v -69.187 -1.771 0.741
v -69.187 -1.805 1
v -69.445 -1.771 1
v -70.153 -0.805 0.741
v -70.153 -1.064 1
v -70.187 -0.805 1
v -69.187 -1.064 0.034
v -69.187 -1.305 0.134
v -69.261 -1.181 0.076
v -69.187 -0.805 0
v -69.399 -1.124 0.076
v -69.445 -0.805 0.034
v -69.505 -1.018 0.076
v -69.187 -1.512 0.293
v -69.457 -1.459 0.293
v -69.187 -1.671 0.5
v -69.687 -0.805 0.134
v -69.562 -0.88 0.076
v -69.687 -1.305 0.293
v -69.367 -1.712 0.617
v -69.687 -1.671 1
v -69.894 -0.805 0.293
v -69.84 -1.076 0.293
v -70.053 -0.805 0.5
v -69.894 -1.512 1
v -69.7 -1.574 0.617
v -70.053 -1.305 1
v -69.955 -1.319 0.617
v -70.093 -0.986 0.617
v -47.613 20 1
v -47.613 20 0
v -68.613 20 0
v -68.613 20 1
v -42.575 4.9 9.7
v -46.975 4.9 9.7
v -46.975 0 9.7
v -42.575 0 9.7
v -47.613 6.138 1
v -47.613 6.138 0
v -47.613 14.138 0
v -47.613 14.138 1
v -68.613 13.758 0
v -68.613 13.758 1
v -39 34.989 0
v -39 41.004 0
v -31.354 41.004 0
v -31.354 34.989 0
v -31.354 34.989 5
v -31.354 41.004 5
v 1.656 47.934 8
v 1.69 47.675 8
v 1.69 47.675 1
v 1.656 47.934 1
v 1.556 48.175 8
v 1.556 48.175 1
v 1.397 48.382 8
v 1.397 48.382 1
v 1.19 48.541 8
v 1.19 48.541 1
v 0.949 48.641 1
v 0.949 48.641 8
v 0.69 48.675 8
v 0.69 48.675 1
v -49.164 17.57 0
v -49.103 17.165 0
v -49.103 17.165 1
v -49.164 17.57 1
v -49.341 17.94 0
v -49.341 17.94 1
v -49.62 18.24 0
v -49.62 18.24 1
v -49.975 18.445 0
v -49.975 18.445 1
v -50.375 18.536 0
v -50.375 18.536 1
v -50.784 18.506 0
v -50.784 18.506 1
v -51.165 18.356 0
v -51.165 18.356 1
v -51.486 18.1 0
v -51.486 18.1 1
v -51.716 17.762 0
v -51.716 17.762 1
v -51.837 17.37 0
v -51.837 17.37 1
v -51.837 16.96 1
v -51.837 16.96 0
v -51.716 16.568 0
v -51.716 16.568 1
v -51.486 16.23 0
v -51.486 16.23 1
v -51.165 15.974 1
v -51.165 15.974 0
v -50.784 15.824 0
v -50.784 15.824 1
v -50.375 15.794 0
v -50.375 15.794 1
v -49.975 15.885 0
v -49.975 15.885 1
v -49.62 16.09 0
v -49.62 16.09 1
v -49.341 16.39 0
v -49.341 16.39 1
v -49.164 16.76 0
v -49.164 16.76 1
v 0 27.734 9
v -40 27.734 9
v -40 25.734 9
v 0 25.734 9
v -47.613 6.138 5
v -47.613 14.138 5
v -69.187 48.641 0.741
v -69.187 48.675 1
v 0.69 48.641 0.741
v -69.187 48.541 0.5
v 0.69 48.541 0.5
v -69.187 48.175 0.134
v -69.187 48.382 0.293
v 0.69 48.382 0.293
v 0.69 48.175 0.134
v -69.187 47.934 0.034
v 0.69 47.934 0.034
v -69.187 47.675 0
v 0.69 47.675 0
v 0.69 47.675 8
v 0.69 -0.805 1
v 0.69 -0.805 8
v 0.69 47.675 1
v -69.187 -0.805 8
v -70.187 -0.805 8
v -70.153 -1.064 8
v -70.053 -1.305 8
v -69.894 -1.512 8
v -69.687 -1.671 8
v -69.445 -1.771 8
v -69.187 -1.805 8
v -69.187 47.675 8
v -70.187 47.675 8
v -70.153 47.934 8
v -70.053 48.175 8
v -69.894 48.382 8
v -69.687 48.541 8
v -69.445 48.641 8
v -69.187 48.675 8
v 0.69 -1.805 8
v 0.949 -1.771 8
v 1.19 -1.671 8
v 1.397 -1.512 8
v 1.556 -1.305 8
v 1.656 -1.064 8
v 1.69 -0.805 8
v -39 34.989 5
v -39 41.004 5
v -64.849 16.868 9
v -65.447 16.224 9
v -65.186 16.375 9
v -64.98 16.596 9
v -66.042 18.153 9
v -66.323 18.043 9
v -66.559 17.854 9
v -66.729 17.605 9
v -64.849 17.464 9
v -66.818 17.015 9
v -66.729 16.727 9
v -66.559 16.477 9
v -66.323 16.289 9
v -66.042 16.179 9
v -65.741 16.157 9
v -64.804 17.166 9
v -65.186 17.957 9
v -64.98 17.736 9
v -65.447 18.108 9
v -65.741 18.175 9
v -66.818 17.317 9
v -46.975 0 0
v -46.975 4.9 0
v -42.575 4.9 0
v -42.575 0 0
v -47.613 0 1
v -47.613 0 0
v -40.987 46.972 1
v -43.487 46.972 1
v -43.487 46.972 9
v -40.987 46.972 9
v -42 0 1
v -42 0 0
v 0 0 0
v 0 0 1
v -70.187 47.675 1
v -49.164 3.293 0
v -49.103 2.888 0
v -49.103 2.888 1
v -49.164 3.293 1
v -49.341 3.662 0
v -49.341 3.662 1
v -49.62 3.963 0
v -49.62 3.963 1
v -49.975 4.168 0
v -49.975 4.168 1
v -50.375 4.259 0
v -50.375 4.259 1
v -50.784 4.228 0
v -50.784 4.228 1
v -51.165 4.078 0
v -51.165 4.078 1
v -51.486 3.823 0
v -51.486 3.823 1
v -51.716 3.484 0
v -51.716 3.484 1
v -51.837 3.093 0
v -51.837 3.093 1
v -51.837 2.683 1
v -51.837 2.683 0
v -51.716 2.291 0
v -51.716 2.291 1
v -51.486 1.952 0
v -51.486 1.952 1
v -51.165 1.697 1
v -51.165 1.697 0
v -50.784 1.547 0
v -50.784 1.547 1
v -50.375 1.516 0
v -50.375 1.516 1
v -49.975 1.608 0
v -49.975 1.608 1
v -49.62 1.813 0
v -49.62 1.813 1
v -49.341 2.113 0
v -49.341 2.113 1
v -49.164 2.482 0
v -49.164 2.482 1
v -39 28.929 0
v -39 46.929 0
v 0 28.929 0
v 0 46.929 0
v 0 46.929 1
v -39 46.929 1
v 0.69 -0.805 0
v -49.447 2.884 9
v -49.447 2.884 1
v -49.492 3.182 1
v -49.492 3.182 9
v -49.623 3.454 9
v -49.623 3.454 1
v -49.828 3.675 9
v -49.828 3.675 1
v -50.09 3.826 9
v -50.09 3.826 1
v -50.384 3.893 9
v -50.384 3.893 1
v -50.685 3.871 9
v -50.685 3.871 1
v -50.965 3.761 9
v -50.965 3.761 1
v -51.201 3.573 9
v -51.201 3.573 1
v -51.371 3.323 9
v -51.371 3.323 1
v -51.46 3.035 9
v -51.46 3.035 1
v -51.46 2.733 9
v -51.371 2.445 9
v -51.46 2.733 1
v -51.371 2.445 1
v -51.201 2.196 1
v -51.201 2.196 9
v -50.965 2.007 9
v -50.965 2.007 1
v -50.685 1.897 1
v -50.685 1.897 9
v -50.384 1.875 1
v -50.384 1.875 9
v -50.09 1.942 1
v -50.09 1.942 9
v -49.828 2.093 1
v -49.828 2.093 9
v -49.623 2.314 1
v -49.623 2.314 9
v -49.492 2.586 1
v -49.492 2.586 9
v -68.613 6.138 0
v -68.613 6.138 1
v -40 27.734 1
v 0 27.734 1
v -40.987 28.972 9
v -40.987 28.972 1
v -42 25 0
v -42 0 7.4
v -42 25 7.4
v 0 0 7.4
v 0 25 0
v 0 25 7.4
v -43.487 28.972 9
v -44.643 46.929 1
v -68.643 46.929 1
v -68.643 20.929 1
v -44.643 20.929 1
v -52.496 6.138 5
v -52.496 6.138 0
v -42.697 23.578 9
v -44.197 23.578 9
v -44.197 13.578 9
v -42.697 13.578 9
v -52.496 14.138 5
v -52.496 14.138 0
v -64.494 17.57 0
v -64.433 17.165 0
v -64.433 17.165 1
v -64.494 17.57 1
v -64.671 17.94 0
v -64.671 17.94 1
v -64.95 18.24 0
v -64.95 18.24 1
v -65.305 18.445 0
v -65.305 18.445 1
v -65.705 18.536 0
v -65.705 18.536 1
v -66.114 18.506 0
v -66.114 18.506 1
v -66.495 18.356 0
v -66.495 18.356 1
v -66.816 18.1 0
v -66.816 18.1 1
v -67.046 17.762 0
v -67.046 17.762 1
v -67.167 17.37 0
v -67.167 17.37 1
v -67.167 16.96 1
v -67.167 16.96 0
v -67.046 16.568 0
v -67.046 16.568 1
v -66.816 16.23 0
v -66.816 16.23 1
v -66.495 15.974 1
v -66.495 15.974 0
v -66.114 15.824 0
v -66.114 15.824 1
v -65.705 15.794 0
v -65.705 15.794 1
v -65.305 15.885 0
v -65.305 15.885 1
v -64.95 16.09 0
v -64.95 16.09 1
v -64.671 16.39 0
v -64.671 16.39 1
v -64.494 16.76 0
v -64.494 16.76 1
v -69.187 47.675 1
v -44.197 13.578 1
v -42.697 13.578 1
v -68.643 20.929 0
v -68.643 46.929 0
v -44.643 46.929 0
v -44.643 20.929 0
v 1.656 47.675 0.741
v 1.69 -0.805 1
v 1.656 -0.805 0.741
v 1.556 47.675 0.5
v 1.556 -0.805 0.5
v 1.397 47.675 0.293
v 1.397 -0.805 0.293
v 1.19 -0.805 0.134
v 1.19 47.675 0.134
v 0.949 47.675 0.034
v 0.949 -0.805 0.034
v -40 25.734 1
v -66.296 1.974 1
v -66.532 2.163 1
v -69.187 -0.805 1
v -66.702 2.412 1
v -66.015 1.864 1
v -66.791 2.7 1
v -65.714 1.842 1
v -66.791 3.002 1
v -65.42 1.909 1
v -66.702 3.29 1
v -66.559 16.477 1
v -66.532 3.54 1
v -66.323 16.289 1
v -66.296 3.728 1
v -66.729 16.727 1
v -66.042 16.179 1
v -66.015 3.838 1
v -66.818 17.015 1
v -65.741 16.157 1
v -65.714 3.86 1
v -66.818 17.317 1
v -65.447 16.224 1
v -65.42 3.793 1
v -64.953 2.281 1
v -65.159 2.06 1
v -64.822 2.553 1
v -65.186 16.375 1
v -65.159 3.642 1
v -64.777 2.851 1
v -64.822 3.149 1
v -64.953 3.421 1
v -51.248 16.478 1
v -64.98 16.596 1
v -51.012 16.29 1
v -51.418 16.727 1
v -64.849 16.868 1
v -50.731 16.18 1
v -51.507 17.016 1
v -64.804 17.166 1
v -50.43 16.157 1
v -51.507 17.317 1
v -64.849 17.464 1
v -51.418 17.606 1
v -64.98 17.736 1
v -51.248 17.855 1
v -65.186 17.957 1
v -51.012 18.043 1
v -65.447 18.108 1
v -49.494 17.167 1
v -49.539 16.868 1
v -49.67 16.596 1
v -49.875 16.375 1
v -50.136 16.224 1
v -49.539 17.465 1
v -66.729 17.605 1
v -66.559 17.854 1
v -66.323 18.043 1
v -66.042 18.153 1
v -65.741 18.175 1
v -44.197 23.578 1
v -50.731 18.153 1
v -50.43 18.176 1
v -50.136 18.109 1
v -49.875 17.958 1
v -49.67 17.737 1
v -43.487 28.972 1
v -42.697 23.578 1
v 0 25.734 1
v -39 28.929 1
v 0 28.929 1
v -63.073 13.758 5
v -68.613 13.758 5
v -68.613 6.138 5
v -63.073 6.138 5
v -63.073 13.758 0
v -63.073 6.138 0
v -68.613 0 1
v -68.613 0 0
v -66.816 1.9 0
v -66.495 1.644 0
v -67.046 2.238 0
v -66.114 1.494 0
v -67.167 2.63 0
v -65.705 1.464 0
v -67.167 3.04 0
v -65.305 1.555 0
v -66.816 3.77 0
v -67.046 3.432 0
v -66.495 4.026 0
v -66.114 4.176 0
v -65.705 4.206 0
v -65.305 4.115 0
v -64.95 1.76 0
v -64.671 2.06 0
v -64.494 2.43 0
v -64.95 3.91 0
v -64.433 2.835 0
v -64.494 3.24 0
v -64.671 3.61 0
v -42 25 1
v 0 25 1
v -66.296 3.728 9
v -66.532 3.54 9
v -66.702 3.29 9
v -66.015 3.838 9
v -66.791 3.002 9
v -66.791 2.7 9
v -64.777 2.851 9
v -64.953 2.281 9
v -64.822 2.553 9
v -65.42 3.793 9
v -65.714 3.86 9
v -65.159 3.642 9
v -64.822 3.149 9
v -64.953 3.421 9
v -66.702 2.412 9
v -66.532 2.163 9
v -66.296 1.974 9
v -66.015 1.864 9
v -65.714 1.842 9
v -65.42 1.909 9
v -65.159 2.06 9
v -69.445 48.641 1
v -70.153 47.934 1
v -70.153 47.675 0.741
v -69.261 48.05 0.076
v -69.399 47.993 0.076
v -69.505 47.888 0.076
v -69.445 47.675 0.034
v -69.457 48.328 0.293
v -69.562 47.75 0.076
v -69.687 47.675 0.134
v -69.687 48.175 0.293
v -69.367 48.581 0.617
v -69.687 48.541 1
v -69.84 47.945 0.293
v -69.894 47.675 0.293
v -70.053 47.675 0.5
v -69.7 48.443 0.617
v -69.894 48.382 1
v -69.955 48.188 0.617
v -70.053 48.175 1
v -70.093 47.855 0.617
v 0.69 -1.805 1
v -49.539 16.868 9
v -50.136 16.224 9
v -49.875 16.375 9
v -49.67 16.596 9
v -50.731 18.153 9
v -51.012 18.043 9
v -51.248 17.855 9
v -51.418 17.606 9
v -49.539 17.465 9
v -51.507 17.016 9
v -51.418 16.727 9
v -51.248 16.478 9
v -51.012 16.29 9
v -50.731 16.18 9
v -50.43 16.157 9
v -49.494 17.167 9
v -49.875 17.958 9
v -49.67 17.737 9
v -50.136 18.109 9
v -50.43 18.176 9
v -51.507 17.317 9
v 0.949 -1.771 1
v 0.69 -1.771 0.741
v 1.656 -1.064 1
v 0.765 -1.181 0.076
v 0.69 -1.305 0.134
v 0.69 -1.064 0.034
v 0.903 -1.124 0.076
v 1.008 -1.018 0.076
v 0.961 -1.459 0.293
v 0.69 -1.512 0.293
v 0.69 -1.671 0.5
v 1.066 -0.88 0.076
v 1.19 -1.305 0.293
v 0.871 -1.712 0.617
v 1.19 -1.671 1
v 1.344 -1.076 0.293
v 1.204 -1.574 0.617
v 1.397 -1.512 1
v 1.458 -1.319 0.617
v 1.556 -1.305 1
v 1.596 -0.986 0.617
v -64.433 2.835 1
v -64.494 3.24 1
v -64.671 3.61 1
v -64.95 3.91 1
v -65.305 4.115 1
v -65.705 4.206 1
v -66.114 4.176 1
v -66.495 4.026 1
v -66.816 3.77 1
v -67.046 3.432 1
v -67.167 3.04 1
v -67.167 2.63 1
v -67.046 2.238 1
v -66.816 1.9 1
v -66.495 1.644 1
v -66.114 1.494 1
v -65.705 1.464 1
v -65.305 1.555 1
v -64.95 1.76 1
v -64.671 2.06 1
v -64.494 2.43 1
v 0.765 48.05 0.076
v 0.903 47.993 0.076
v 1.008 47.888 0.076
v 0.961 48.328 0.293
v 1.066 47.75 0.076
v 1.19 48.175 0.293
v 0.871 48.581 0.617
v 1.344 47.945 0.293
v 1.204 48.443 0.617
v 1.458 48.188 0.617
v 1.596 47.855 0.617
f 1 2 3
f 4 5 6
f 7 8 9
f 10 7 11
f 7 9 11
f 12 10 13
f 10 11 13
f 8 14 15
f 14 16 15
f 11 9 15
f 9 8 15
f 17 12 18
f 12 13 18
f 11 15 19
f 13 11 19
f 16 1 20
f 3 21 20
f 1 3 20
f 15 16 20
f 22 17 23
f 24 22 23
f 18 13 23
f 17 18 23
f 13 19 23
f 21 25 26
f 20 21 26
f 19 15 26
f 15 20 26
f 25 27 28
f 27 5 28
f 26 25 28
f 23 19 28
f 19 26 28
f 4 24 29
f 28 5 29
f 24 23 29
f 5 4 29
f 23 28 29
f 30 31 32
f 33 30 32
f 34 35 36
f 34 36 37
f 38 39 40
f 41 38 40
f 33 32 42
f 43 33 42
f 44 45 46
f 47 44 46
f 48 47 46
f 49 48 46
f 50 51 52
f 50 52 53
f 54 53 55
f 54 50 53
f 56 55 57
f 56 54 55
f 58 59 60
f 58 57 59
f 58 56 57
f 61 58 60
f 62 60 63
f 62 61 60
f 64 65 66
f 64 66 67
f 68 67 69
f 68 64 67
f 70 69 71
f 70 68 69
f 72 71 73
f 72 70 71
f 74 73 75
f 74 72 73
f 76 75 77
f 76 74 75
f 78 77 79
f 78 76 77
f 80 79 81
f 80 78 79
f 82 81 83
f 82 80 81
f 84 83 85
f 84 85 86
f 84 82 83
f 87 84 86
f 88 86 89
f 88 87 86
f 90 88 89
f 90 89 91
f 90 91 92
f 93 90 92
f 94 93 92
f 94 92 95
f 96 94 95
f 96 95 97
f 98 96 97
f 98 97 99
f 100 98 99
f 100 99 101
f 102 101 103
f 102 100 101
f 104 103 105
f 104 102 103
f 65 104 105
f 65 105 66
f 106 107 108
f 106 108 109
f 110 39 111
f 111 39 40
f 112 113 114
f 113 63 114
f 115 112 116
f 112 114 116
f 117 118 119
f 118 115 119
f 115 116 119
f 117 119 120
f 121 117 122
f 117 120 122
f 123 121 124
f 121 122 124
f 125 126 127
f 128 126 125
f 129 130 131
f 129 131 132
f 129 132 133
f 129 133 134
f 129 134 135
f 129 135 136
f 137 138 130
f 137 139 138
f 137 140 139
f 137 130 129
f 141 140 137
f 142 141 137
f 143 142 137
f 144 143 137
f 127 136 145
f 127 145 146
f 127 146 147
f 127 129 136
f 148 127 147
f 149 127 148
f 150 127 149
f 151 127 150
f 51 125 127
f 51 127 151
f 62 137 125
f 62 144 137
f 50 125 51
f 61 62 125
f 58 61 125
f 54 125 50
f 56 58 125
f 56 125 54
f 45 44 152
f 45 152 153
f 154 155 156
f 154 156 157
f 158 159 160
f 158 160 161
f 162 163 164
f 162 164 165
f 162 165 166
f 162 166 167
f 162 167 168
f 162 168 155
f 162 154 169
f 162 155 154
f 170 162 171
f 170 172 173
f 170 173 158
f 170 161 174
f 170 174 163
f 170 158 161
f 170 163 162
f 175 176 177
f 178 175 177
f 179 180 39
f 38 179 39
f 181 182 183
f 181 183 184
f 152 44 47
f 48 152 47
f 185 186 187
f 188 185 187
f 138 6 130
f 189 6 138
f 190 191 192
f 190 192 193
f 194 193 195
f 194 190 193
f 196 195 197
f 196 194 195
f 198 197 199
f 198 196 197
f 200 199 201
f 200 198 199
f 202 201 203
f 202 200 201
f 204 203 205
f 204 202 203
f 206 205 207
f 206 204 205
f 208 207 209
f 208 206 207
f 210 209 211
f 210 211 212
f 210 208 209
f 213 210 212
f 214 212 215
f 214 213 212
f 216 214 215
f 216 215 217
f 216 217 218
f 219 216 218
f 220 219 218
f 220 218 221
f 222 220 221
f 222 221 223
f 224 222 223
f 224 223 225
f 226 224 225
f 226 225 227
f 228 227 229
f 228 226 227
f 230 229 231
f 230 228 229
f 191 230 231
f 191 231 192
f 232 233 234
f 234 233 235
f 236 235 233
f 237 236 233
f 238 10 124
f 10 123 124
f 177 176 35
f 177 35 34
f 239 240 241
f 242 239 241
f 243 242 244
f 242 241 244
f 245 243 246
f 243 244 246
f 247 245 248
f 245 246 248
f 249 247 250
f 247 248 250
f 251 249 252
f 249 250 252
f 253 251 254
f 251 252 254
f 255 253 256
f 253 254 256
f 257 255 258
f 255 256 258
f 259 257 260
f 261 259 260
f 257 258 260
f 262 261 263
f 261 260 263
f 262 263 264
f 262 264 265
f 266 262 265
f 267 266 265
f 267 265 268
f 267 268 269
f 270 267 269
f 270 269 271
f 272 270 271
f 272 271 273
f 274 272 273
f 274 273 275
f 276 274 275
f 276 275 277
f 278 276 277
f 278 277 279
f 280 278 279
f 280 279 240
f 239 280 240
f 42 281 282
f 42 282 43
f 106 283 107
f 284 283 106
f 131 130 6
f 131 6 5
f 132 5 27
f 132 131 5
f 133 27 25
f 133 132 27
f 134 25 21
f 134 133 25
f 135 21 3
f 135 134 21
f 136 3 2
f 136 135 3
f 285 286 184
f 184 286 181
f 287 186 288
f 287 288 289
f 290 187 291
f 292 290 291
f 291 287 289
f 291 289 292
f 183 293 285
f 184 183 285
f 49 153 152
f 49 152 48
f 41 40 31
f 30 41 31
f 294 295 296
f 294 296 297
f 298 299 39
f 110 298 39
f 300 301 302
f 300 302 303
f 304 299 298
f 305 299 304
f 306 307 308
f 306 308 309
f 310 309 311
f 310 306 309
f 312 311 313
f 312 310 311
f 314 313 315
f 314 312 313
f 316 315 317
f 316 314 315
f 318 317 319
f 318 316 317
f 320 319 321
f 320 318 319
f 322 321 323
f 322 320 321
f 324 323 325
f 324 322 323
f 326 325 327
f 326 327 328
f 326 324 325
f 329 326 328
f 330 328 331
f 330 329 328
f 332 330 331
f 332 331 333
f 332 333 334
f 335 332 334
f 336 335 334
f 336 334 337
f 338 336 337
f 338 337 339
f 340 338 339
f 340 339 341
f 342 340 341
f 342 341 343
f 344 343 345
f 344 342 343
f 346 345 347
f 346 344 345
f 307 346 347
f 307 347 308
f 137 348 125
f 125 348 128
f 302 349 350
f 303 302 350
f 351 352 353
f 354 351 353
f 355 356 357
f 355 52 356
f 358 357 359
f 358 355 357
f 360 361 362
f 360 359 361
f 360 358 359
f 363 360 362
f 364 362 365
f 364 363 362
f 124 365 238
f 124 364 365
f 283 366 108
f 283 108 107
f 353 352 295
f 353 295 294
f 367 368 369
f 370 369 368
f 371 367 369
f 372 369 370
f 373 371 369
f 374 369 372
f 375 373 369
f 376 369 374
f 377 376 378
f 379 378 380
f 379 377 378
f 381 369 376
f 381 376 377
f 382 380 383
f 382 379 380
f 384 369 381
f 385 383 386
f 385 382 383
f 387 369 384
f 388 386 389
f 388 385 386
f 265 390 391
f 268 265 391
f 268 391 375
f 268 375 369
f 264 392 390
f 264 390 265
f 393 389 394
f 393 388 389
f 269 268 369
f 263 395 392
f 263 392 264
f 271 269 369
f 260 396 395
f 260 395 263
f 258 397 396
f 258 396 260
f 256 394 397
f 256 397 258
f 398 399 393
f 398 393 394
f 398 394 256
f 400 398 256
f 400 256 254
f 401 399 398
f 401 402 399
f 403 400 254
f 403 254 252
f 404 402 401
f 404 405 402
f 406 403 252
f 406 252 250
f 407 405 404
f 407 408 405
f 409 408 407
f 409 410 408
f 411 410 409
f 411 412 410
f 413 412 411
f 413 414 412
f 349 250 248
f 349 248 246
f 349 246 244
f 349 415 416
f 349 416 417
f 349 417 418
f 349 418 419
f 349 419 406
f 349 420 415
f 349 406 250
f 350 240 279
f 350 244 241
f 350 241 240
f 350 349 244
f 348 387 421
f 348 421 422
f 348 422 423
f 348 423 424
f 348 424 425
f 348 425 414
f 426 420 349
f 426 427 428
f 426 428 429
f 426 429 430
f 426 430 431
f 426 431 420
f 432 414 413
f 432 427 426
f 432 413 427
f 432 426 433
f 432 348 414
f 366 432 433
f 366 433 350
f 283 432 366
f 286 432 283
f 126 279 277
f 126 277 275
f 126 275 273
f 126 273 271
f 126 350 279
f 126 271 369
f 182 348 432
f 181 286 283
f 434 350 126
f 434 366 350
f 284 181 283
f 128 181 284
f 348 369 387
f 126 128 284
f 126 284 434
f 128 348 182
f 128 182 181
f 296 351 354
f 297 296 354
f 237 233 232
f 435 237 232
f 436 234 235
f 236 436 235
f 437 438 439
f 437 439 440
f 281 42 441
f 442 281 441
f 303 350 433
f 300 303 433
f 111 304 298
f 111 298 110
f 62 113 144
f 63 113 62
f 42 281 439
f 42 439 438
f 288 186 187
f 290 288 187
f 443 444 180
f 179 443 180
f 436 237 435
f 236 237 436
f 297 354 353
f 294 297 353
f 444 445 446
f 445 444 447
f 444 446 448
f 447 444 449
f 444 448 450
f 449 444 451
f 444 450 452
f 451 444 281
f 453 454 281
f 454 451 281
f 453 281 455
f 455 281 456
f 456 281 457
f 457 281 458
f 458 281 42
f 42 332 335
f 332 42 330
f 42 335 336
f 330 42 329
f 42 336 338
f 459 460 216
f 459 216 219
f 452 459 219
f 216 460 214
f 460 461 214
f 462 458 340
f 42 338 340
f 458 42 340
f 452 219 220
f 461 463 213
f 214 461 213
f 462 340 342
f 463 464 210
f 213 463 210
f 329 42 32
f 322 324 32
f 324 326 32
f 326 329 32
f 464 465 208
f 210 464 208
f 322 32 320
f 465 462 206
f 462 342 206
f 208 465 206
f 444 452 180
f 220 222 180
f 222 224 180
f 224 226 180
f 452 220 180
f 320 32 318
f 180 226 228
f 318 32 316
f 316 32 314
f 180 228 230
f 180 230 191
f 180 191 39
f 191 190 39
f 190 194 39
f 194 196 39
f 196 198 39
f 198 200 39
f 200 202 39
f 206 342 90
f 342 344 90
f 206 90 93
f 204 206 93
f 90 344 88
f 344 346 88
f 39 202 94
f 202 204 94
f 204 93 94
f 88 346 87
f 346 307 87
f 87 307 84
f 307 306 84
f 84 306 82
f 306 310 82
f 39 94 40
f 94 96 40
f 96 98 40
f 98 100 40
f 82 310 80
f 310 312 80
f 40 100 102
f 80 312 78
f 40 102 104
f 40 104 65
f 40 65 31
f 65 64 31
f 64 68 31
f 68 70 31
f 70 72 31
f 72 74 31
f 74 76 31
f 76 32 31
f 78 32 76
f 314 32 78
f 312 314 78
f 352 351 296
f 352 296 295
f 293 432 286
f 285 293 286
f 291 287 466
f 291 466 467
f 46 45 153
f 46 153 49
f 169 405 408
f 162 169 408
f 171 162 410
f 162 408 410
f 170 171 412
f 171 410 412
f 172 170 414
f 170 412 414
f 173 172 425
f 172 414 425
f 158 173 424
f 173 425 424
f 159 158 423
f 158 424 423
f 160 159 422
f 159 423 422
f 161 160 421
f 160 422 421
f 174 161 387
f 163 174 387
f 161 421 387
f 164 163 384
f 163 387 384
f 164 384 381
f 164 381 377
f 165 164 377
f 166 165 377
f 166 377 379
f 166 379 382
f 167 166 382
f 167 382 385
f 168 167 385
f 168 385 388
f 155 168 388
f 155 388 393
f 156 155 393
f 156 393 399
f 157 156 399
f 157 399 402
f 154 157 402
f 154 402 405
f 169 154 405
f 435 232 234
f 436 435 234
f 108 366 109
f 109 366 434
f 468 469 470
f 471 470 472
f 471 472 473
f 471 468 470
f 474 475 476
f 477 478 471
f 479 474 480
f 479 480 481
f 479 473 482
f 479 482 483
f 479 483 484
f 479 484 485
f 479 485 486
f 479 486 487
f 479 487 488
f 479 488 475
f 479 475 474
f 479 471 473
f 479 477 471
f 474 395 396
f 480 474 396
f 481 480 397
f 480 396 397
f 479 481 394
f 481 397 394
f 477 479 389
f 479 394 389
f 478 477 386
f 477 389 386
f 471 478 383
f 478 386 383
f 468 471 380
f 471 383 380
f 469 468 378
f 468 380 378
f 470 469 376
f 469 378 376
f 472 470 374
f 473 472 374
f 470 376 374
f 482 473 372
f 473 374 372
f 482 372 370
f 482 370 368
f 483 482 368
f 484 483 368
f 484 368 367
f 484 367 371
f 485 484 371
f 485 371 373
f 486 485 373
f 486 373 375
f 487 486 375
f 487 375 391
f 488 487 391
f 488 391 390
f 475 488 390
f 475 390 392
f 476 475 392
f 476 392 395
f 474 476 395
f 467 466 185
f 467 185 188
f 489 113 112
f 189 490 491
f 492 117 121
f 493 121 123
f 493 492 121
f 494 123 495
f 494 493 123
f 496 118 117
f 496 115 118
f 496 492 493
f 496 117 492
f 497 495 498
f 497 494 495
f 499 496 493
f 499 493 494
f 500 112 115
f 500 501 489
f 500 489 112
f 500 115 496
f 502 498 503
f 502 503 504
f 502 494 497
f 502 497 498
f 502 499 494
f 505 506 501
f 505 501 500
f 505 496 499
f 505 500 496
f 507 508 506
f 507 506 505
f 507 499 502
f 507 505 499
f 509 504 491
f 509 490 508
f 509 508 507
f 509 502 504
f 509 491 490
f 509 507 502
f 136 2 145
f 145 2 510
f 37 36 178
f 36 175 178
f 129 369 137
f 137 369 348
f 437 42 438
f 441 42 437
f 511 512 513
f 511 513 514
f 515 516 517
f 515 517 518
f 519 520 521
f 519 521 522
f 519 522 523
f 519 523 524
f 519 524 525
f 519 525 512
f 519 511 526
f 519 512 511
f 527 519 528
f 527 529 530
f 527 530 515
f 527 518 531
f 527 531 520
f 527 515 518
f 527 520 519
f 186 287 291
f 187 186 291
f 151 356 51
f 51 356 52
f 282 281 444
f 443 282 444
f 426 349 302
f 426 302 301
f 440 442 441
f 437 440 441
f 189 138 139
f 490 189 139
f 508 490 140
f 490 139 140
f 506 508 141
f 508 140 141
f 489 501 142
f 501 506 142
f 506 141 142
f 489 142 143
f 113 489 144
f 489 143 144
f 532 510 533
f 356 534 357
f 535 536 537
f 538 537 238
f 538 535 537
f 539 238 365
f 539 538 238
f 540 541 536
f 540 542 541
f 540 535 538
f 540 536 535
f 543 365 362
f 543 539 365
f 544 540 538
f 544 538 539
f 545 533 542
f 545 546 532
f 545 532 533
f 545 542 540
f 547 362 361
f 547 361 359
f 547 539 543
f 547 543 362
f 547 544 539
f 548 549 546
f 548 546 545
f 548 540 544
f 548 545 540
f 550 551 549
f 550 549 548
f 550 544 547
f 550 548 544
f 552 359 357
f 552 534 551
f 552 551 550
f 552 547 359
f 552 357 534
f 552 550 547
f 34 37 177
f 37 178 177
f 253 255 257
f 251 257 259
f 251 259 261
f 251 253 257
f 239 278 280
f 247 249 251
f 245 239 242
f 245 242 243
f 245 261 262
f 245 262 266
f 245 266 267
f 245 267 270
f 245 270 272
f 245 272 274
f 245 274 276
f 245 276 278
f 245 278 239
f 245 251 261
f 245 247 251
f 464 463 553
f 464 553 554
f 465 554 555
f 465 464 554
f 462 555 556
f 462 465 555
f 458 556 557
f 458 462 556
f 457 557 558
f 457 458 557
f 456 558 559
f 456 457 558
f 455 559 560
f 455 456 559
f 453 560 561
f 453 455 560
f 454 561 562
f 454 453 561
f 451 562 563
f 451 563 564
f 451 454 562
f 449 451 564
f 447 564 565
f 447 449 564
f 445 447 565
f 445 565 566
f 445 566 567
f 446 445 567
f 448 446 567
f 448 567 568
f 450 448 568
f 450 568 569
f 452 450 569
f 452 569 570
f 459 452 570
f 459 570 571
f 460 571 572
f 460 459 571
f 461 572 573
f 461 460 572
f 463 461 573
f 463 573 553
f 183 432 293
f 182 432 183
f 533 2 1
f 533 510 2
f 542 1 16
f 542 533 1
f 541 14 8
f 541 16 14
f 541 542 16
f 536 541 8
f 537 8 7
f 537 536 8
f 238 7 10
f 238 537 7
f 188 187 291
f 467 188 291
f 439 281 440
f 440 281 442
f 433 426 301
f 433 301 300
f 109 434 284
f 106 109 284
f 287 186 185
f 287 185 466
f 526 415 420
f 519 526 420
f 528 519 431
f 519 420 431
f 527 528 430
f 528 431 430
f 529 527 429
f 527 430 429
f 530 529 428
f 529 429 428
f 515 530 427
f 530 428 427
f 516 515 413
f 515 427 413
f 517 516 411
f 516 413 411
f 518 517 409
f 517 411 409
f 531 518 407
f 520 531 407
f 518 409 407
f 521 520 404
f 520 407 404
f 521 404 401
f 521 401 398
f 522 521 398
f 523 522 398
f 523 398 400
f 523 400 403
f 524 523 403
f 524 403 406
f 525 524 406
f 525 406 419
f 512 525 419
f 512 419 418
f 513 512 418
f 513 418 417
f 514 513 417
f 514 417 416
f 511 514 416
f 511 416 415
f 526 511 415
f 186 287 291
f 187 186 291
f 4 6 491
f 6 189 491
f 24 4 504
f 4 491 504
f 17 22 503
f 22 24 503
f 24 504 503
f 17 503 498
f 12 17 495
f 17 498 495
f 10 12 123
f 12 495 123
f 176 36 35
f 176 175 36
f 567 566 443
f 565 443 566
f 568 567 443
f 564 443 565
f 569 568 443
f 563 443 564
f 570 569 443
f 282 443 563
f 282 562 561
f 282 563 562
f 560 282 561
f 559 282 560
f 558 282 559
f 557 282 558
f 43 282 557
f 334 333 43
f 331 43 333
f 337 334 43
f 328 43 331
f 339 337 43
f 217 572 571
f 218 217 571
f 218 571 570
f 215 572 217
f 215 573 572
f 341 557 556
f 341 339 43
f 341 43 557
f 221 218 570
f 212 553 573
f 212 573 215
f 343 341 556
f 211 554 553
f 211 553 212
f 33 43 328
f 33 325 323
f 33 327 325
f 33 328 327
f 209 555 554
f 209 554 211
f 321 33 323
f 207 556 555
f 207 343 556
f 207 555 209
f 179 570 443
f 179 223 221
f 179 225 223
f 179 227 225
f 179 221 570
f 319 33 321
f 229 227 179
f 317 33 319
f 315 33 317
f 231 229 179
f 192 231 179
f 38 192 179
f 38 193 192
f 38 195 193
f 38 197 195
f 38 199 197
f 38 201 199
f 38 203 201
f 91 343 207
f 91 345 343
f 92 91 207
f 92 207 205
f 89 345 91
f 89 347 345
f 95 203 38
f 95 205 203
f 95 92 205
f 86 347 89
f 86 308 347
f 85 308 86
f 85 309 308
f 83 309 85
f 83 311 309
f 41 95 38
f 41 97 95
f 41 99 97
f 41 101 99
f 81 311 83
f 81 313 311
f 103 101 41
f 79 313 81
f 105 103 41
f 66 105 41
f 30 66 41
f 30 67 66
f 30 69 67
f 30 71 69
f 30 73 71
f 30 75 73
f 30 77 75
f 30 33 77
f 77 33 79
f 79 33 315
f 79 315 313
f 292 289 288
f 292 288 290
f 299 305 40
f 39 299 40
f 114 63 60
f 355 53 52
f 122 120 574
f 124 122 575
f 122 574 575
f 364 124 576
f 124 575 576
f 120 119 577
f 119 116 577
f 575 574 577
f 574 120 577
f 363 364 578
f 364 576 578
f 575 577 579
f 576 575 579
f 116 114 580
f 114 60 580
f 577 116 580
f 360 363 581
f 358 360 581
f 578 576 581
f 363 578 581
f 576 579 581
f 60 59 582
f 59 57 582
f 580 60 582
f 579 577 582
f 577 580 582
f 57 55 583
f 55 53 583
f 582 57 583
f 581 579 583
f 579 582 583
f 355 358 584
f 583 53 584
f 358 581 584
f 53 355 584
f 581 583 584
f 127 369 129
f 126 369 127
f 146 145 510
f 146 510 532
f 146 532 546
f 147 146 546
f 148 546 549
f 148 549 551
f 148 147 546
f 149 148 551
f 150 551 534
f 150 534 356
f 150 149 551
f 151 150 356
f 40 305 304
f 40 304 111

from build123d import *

# Parameters (mm, degrees)
F0_W      = 42
F0_H      = 25
F1_DEPTH  = 7.4
F0_W_2    = 7.6458
F0_H_2    = 6.015226
F0_R      = 1.375
F0_W_3    = 4.883553
F0_H_3    = 8
F0_W_4    = 5.540341
F0_H_4    = 7.62
F0_W_5    = 24
F0_H_5    = 26
F0_W_6    = 4.4
F0_H_6    = 4.9
F2_DEPTH  = 1
F3_DEPTH  = 5
F2_FACE_W = 4.4
F2_FACE_H = 4.9
F4_DEPTH  = 8.7
F5_W      = 71.876958
F5_H      = 50.480289
F6_DEPTH  = 8
F7_T      = -1
F8_R      = 1
F9_W      = 40
F9_H      = 2
F9_W_2    = 1.5
F9_H_2    = 10
F9_W_3    = 2.5
F9_H_3    = 18
F9_R      = 1.012254
F10_DEPTH = 9


with BuildPart() as f1:
    # F0 (on Top) → F1 (new body)
    with BuildSketch(Plane.XY):
        with Locations((-21, 12.5)):
            Rectangle(F0_W, F0_H)
    extrude(amount=F1_DEPTH)


with BuildPart() as f2:
    # F0 (on Top) → F2 (new body)
    with BuildSketch(Plane.XY):
        with Locations((-21, 12.5)):
            Rectangle(F0_W, F0_H)
        Polygon((-39, 28.92908), (0, 28.92908), (0, 46.92908), (-39, 46.92908), (-39, 41.003898), (-31.3542, 41.003898), (-31.3542, 34.988672), (-39, 34.988672), align=None)
        with Locations((-35.1771, 37.996285)):
            Rectangle(F0_W_2, F0_H_2)
        Polygon((-68.612888, 0), (-47.612888, 0), (-47.612888, 6.138186), (-52.496441, 6.138186), (-52.496441, 14.138186), (-47.612888, 14.138186), (-47.612888, 20), (-68.612888, 20), (-68.612888, 13.758186), (-63.072547, 13.758186), (-63.072547, 6.138186), (-68.612888, 6.138186), align=None)
        with Locations((-65.807572, 2.835)):
            Circle(F0_R, mode=Mode.SUBTRACT)
        with Locations((-50.477572, 2.887582)):
            Circle(F0_R, mode=Mode.SUBTRACT)
        with Locations((-65.807572, 17.165)):
            Circle(F0_R, mode=Mode.SUBTRACT)
        with Locations((-50.477572, 17.165)):
            Circle(F0_R, mode=Mode.SUBTRACT)
        with Locations((-50.054665, 10.138186)):
            Rectangle(F0_W_3, F0_H_3)
        with Locations((-65.842717, 9.948186)):
            Rectangle(F0_W_4, F0_H_4)
        with Locations((-56.642572, 33.92908)):
            Rectangle(F0_W_5, F0_H_5)
        with Locations((-44.775128, 2.45)):
            Rectangle(F0_W_6, F0_H_6)
    extrude(amount=F2_DEPTH)

    # F2_face (on face) → F4 (join)
    with BuildSketch(Plane(origin=(-44.775128, 2.45, 1), x_dir=(1, 0, 0), z_dir=(0, 0, 1))):
        Rectangle(F2_FACE_W, F2_FACE_H)
    extrude(amount=F4_DEPTH)


with BuildPart() as f3:
    # F0 (on Top) → F3 (new body)
    with BuildSketch(Plane.XY):
        with Locations((-65.842717, 9.948186)):
            Rectangle(F0_W_4, F0_H_4)
        with Locations((-50.054665, 10.138186)):
            Rectangle(F0_W_3, F0_H_3)
        with Locations((-35.1771, 37.996285)):
            Rectangle(F0_W_2, F0_H_2)
    extrude(amount=F3_DEPTH)


with BuildPart() as f6:
    # F5 (on Top) → F6 (new body)
    with BuildSketch(Plane.XY):
        with Locations((-34.248188, 23.434756)):
            Rectangle(F5_W, F5_H)
    extrude(amount=F6_DEPTH)

    # F7
    f7_openings = [f6.faces().sort_by_distance(p)[0] for p in [
        (-34.248188, 23.434756, 8),
    ]]
    offset(amount=F7_T, openings=f7_openings)

    # F8
    f8_edges = [f6.edges().sort_by_distance(p)[0] for p in [
        (-70.186667, -1.805389, 4),
        (1.690291, -1.805389, 4),
        (1.690291, 48.6749, 4),
        (-70.186667, 48.6749, 4),
        (-34.248188, -1.805389, 0),
        (-34.248188, 48.6749, 0),
        (1.690291, 23.434756, 0),
        (-70.186667, 23.434756, 0),
    ]]
    fillet(f8_edges, radius=F8_R)

    # F9 (on Top) → F10 (join)
    with BuildSketch(Plane.XY):
        with Locations((-20, 26.733725)):
            Rectangle(F9_W, F9_H)
        with Locations((-43.447123, 18.578285)):
            Rectangle(F9_W_2, F9_H_2)
        with Locations((-42.236629, 37.972019)):
            Rectangle(F9_W_3, F9_H_3)
        with Locations((-65.816745, 17.16597)):
            Circle(F9_R)
        with Locations((-65.78964, 2.851029)):
            Circle(F9_R)
        with Locations((-50.459358, 2.884068)):
            Circle(F9_R)
        with Locations((-50.505989, 17.166505)):
            Circle(F9_R)
    extrude(amount=F10_DEPTH)


solid = Compound([f1.part, f2.part, f3.part, f6.part])
